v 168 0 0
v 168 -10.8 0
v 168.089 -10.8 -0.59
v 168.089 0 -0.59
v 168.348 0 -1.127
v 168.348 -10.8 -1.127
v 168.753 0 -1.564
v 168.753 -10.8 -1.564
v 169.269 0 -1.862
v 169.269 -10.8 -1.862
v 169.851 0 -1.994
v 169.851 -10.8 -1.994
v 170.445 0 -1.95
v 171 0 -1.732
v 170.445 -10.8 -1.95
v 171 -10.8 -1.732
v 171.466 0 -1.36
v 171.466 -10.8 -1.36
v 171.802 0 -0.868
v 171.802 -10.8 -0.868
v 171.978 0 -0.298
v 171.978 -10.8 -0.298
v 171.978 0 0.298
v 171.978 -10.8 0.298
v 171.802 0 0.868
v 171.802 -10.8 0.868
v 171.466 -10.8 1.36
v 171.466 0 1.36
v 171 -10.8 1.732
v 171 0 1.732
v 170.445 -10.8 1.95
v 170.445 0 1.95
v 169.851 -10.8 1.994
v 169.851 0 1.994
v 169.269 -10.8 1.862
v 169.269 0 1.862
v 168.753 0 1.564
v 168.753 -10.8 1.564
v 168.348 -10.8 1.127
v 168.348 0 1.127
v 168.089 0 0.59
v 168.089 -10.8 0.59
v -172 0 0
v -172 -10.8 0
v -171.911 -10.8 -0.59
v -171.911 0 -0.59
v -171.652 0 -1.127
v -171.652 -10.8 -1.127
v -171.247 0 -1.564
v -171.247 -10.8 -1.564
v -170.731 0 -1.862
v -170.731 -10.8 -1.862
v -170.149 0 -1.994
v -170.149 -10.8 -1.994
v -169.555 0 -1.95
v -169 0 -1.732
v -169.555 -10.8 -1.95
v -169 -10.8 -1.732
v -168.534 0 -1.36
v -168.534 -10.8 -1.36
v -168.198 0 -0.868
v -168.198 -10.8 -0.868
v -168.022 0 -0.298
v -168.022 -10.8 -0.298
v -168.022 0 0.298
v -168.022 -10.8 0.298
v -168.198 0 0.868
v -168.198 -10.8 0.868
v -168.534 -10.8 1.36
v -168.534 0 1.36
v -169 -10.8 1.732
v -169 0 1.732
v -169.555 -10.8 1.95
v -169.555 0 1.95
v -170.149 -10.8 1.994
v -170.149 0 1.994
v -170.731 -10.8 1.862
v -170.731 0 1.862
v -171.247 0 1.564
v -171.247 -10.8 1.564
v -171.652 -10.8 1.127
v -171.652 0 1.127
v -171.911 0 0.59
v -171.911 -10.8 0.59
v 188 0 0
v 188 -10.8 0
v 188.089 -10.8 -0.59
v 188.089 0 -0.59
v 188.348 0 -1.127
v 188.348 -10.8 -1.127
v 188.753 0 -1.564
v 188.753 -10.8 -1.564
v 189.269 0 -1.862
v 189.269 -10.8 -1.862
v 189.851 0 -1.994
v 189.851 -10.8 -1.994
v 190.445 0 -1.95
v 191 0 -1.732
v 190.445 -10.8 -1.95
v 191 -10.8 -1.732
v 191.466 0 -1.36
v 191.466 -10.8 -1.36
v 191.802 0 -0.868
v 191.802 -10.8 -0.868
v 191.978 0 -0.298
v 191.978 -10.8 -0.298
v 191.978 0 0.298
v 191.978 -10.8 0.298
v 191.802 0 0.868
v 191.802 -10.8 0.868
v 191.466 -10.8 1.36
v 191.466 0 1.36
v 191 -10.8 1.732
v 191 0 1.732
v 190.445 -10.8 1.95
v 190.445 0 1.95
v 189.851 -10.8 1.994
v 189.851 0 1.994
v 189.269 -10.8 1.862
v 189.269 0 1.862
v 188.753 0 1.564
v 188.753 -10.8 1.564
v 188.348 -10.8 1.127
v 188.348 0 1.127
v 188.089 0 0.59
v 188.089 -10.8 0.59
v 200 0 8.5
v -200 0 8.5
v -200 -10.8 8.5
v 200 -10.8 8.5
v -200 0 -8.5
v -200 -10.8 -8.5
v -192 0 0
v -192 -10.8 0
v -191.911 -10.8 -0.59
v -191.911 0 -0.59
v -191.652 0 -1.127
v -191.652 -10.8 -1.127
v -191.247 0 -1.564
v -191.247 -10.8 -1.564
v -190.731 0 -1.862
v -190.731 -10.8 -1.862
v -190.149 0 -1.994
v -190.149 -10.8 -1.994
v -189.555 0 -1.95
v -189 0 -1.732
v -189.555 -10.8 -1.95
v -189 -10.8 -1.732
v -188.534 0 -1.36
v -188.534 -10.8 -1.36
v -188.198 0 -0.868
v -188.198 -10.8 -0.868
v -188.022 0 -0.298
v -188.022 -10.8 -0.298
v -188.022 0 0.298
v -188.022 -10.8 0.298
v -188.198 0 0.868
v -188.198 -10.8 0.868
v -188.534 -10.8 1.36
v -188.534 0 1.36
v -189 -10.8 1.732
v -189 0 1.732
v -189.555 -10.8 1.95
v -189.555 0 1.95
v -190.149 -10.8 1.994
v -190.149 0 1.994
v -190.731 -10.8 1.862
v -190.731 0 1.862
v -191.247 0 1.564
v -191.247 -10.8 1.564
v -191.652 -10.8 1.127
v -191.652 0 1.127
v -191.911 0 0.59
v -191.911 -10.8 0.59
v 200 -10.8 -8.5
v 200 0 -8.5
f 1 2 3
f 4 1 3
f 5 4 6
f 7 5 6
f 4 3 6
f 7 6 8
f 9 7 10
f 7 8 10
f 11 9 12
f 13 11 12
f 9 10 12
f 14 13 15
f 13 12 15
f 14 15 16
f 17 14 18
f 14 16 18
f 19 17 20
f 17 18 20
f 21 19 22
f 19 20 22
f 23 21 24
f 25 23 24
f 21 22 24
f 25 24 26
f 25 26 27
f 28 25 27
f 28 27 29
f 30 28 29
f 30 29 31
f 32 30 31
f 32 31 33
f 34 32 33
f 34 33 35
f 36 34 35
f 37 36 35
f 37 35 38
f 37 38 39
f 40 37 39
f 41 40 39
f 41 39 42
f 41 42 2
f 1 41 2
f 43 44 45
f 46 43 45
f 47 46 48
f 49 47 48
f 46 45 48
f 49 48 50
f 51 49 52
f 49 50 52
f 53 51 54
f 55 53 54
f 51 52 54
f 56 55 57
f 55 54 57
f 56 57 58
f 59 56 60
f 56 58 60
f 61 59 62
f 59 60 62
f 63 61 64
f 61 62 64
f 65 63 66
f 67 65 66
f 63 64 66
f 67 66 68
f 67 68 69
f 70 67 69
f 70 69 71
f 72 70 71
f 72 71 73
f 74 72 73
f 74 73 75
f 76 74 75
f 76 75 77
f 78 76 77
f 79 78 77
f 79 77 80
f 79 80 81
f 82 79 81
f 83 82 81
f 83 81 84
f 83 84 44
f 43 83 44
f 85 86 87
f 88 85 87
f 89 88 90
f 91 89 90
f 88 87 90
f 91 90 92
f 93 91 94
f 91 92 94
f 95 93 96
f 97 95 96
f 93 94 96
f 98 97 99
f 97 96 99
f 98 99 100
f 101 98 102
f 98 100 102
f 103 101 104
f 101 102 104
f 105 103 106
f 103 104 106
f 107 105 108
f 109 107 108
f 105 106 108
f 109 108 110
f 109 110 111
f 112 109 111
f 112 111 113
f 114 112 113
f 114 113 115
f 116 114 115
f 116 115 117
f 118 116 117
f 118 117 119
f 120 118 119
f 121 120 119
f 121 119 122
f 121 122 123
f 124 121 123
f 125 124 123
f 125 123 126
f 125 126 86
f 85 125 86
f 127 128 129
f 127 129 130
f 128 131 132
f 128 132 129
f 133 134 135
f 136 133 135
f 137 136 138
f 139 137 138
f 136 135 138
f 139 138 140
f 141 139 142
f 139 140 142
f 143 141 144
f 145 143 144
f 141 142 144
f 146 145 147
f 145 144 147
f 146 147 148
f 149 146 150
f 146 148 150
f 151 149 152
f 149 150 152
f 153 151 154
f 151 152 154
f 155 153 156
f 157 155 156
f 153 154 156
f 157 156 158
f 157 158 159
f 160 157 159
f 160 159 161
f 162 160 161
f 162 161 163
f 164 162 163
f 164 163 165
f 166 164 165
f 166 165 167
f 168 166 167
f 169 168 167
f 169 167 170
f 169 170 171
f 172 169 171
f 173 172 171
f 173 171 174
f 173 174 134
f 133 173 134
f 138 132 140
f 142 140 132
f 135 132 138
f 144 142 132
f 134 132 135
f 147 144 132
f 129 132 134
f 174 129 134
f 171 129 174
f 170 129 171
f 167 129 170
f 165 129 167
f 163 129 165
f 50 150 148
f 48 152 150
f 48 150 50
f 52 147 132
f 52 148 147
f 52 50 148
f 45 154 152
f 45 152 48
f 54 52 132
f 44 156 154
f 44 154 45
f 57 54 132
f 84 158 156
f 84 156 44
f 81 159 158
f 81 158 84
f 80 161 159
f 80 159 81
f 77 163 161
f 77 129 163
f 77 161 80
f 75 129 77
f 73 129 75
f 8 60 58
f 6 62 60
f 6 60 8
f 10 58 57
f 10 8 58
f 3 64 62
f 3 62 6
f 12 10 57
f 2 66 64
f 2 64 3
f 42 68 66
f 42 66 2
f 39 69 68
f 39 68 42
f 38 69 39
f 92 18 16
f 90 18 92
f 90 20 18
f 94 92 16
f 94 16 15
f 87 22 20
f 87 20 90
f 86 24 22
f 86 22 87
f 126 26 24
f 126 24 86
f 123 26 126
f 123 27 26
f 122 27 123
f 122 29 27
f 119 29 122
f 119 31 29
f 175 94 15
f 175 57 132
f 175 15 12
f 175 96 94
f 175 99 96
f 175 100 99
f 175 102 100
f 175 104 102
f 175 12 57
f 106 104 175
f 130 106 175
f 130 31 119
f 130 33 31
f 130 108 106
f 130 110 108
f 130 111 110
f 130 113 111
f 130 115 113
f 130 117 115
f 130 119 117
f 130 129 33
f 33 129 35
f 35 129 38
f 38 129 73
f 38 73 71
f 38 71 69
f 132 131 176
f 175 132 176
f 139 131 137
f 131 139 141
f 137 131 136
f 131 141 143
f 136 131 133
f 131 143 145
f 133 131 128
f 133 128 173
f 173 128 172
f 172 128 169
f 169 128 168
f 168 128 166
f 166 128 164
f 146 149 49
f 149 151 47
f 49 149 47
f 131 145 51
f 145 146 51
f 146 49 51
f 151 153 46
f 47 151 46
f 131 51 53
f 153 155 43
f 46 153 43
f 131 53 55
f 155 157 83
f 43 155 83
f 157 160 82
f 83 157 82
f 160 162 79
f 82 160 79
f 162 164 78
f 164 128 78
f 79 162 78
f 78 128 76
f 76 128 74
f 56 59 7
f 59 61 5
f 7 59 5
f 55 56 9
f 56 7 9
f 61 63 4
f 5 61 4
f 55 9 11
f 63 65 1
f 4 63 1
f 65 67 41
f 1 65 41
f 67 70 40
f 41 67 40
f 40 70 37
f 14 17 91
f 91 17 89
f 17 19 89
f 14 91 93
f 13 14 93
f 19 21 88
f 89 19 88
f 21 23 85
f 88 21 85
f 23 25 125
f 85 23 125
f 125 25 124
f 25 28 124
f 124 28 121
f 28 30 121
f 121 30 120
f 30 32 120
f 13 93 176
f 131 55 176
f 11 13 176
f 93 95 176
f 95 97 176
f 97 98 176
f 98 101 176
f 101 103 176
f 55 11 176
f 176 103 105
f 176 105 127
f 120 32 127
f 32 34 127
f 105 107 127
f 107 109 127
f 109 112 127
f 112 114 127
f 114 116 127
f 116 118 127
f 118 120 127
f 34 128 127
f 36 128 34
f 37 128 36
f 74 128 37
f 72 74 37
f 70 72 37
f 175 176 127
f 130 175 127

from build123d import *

# Parameters (mm, degrees)
F0_W     = 400
F0_H     = 17
F1_DEPTH = 10.8
F2_D     = 4


with BuildPart() as f1:
    # F0 (on Front) → F1 (new body)
    with BuildSketch(Plane.XZ):
        Rectangle(F0_W, F0_H)
    extrude(amount=F1_DEPTH)

    # F2 (through all)
    with Locations(Plane(origin=(0, 0, 0), x_dir=(1, 0, 0), z_dir=(0, 1, 0))):
        with Locations((-190, 0), (-170, 0), (170, 0), (190, 0)):
            Hole(F2_D / 2)


solid = f1.part
